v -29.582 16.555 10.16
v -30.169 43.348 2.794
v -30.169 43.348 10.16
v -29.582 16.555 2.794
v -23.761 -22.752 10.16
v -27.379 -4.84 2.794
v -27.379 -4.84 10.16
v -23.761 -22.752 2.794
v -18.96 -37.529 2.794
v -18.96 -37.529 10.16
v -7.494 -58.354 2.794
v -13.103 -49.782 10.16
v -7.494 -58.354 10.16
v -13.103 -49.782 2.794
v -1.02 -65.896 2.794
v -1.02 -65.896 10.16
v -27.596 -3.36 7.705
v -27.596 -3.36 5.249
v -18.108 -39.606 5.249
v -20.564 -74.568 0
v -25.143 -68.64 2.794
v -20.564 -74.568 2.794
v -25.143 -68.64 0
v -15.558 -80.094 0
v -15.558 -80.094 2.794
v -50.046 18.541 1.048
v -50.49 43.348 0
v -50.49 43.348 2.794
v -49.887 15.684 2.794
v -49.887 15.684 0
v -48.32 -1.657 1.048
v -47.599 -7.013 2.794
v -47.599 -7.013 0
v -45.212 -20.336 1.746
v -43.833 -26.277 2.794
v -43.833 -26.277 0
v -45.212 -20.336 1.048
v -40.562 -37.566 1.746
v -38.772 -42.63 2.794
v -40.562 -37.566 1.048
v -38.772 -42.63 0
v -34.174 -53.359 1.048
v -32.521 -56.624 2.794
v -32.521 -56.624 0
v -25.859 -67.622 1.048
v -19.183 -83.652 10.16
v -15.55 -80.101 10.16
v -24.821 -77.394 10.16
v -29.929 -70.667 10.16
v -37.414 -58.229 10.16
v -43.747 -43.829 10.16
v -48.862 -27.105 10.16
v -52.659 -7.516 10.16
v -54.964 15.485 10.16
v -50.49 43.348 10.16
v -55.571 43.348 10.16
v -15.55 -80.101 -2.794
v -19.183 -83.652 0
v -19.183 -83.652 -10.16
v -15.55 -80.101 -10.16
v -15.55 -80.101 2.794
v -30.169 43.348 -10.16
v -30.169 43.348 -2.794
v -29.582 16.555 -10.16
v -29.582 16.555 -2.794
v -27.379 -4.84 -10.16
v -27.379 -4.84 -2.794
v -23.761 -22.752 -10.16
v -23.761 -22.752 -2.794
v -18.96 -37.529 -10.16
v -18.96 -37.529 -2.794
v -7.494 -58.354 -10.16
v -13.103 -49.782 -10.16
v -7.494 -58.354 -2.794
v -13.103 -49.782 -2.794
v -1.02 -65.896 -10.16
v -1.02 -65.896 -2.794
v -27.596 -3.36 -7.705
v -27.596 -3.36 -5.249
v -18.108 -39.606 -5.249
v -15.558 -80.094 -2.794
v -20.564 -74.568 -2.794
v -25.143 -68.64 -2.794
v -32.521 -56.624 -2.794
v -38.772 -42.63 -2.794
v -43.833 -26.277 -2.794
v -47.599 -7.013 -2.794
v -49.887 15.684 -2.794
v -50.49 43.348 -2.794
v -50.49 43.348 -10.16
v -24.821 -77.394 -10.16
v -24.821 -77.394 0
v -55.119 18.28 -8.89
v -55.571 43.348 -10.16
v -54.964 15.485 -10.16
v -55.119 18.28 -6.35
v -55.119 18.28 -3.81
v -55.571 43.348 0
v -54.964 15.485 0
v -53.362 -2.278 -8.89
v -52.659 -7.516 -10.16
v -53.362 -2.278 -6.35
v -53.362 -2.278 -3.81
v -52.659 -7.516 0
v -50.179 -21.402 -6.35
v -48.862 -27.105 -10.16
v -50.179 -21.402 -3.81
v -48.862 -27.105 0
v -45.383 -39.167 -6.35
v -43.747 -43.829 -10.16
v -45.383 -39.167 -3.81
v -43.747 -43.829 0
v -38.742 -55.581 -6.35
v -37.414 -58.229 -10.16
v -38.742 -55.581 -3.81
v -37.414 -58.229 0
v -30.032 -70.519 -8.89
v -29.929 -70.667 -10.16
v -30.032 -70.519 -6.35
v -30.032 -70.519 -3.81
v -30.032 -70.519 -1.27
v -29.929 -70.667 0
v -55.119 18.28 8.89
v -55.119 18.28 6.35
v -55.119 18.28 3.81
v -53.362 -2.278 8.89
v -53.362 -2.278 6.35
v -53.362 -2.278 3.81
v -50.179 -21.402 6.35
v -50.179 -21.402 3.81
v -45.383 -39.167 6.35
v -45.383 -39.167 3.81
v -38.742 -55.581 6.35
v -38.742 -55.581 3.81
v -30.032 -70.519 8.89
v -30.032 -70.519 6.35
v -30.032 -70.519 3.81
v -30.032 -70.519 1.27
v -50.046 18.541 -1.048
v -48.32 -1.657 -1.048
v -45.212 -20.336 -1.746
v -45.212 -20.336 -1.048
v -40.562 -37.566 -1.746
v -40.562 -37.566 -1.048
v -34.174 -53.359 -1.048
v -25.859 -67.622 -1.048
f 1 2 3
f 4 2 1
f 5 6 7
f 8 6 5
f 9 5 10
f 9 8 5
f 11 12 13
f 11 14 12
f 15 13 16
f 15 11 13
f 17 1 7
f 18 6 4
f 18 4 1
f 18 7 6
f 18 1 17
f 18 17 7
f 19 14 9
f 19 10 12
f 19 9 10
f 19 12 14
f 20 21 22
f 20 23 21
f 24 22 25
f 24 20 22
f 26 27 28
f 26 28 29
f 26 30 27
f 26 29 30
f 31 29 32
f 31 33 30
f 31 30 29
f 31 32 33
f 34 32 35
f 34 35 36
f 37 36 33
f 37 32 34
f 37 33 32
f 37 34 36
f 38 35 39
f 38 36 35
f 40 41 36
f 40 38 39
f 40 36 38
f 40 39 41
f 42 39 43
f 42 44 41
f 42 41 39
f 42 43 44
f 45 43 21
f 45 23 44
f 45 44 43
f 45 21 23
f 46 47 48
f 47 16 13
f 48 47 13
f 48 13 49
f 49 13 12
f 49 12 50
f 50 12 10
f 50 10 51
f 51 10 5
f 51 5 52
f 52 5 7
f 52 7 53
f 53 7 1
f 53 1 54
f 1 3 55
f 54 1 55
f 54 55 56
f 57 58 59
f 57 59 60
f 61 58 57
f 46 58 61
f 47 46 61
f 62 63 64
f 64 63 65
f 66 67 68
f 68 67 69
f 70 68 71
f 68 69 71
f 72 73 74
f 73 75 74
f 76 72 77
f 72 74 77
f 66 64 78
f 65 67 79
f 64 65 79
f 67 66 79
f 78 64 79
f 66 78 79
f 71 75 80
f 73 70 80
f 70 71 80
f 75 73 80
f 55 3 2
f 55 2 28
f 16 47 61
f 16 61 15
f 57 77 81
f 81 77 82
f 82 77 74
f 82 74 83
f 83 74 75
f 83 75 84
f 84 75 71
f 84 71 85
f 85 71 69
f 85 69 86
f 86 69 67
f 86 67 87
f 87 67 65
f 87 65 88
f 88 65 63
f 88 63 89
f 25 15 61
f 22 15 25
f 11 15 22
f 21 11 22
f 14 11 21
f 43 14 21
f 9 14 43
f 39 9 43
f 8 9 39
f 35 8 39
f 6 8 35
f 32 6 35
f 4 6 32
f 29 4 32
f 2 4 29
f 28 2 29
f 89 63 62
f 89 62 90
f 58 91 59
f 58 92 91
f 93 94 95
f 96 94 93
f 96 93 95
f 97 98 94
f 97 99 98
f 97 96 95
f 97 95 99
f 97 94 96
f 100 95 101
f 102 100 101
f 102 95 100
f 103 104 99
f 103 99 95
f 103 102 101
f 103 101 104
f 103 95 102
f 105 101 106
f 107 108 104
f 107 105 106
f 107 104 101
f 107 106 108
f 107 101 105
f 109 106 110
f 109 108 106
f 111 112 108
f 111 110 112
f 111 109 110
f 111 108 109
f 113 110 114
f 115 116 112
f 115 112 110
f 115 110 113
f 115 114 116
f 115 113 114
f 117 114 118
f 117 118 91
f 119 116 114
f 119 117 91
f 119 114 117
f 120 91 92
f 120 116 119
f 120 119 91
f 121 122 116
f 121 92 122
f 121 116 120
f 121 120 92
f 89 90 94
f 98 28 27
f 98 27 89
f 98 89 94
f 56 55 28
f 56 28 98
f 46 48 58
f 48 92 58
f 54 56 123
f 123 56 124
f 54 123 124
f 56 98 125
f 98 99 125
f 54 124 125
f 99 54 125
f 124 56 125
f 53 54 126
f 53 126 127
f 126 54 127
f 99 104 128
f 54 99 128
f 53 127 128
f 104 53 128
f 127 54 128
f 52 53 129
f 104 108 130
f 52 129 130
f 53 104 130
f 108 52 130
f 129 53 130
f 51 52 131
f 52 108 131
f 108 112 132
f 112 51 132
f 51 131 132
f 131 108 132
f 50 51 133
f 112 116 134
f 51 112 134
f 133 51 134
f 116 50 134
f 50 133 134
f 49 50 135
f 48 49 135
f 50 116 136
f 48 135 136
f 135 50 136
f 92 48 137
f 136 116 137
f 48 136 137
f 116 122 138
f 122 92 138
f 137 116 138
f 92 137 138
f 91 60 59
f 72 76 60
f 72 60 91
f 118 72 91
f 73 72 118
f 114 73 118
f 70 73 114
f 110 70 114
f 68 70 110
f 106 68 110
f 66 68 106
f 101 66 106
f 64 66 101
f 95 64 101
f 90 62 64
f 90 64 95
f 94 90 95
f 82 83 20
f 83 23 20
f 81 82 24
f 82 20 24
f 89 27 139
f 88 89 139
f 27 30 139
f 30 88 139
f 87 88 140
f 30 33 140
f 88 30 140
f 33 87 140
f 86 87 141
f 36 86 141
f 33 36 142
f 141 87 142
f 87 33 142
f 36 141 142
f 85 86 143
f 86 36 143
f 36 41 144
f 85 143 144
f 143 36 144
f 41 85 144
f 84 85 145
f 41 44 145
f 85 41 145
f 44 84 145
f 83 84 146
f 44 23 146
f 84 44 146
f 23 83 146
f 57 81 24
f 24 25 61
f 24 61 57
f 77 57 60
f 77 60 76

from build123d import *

# Parameters (mm, degrees)
F1_DEPTH = 10.16
F2_DEPTH = 2.794


# Not quite as in the source:
# - ends of sketch curves that miss each other by under 0.0002 mm in the source are joined


with BuildPart() as f1:
    # F0 (on Top) → F1 (new body, symmetric)
    with BuildSketch(Plane.XY):
        with BuildLine():
            add(Edge.make_bspline(
                [(-30.1686804344, 43.3476526069), (-30.8248162722, -8.7581067609), (-22.1361141771, -44.4161965277), (-1.0204318918, -65.8959671855)],
                knots=[14.1187831422, 14.1187831422, 14.1187831422, 14.1187831422, 131.8278556138, 131.8278556138, 131.8278556138, 131.8278556138], degree=3))
            Line((-30.1686804344, 43.3476526069), (-50.4902243697, 43.3476526069))
            add(Edge.make_bspline(
                [(-50.4902243697, 43.3476526069), (-50.5023356823, 42.3416381346), (-50.5776631638, 33.7575699347), (-50.2547042611, 18.2728647958), (-48.5490186564, -1.9094845449), (-45.4683930825, -20.5766183405), (-40.8513482733, -37.8029140743), (-34.4978508868, -53.6097599892), (-26.2151831057, -67.8904361601), (-19.3239866258, -76.2568786685), (-15.5576457112, -80.0936870299)],
                knots=[0.1084983974, 0.1084983974, 0.1084983974, 0.1084983974, 0.125, 0.25, 0.375, 0.5, 0.625, 0.75, 0.875, 0.9994876672, 0.9994876672, 0.9994876672, 0.9994876672], degree=3))
            Line((-15.5576457112, -80.0936870299), (-15.5504097194, -80.1010887171))
            Line((-15.5504097194, -80.1010887171), (-1.0204318918, -65.8959671855))
        make_face()
        with BuildLine():
            add(Edge.make_bspline(
                [(-50.4902243697, 43.3476526462), (-50.5023356823, 42.3416381346), (-50.5776631638, 33.7575699347), (-50.2547042611, 18.2728647958), (-48.5490186564, -1.9094845449), (-45.4683930825, -20.5766183405), (-40.8513482733, -37.8029140743), (-34.4978508868, -53.6097599892), (-26.2151831057, -67.8904361601), (-19.3239866258, -76.2568786685), (-15.5576457112, -80.0936870299)],
                knots=[0.1084983974, 0.1084983974, 0.1084983974, 0.1084983974, 0.125, 0.25, 0.375, 0.5, 0.625, 0.75, 0.875, 0.9994876672, 0.9994876672, 0.9994876672, 0.9994876672], degree=3))
            Line((-50.4902243697, 43.3476526462), (-55.5705854562, 43.3476526069))
            add(Edge.make_bspline(
                [(-55.5705854562, 43.3476526069), (-55.5824542112, 42.3512221988), (-55.6578660057, 33.6924970547), (-55.3319230242, 18.0236423903), (-53.5978680793, -2.5165326287), (-50.4470600065, -21.6261667001), (-45.6901847728, -39.3890823186), (-39.0903346211, -55.8222129569), (-30.4150960171, -70.7885790199), (-23.1570048132, -79.6038664954), (-19.1828818554, -83.6523472777)],
                knots=[0.1088294141, 0.1088294141, 0.1088294141, 0.1088294141, 0.125, 0.25, 0.375, 0.5, 0.625, 0.75, 0.875, 0.9994877133, 0.9994877133, 0.9994877133, 0.9994877133], degree=3))
            Line((-19.1828818554, -83.6523472777), (-15.5504097194, -80.1010887171))
            Line((-15.5504097194, -80.1010887171), (-15.5576457112, -80.0936870299))
        make_face()
    extrude(amount=F1_DEPTH, both=True)

    # F0 (on Top) → F2 (cut, symmetric)
    with BuildSketch(Plane.XY):
        with BuildLine():
            add(Edge.make_bspline(
                [(-30.1686804344, 43.3476526069), (-30.8248162722, -8.7581067609), (-22.1361141771, -44.4161965277), (-1.0204318918, -65.8959671855)],
                knots=[14.1187831422, 14.1187831422, 14.1187831422, 14.1187831422, 131.8278556138, 131.8278556138, 131.8278556138, 131.8278556138], degree=3))
            Line((-30.1686804344, 43.3476526069), (-50.4902243697, 43.3476526069))
            add(Edge.make_bspline(
                [(-50.4902243697, 43.3476526069), (-50.5023356823, 42.3416381346), (-50.5776631638, 33.7575699347), (-50.2547042611, 18.2728647958), (-48.5490186564, -1.9094845449), (-45.4683930825, -20.5766183405), (-40.8513482733, -37.8029140743), (-34.4978508868, -53.6097599892), (-26.2151831057, -67.8904361601), (-19.3239866258, -76.2568786685), (-15.5576457112, -80.0936870299)],
                knots=[0.1084983974, 0.1084983974, 0.1084983974, 0.1084983974, 0.125, 0.25, 0.375, 0.5, 0.625, 0.75, 0.875, 0.9994876672, 0.9994876672, 0.9994876672, 0.9994876672], degree=3))
            Line((-15.5576457112, -80.0936870299), (-15.5504097194, -80.1010887171))
            Line((-15.5504097194, -80.1010887171), (-1.0204318918, -65.8959671855))
        make_face()
    extrude(amount=F2_DEPTH, both=True, mode=Mode.SUBTRACT)


solid = f1.part
